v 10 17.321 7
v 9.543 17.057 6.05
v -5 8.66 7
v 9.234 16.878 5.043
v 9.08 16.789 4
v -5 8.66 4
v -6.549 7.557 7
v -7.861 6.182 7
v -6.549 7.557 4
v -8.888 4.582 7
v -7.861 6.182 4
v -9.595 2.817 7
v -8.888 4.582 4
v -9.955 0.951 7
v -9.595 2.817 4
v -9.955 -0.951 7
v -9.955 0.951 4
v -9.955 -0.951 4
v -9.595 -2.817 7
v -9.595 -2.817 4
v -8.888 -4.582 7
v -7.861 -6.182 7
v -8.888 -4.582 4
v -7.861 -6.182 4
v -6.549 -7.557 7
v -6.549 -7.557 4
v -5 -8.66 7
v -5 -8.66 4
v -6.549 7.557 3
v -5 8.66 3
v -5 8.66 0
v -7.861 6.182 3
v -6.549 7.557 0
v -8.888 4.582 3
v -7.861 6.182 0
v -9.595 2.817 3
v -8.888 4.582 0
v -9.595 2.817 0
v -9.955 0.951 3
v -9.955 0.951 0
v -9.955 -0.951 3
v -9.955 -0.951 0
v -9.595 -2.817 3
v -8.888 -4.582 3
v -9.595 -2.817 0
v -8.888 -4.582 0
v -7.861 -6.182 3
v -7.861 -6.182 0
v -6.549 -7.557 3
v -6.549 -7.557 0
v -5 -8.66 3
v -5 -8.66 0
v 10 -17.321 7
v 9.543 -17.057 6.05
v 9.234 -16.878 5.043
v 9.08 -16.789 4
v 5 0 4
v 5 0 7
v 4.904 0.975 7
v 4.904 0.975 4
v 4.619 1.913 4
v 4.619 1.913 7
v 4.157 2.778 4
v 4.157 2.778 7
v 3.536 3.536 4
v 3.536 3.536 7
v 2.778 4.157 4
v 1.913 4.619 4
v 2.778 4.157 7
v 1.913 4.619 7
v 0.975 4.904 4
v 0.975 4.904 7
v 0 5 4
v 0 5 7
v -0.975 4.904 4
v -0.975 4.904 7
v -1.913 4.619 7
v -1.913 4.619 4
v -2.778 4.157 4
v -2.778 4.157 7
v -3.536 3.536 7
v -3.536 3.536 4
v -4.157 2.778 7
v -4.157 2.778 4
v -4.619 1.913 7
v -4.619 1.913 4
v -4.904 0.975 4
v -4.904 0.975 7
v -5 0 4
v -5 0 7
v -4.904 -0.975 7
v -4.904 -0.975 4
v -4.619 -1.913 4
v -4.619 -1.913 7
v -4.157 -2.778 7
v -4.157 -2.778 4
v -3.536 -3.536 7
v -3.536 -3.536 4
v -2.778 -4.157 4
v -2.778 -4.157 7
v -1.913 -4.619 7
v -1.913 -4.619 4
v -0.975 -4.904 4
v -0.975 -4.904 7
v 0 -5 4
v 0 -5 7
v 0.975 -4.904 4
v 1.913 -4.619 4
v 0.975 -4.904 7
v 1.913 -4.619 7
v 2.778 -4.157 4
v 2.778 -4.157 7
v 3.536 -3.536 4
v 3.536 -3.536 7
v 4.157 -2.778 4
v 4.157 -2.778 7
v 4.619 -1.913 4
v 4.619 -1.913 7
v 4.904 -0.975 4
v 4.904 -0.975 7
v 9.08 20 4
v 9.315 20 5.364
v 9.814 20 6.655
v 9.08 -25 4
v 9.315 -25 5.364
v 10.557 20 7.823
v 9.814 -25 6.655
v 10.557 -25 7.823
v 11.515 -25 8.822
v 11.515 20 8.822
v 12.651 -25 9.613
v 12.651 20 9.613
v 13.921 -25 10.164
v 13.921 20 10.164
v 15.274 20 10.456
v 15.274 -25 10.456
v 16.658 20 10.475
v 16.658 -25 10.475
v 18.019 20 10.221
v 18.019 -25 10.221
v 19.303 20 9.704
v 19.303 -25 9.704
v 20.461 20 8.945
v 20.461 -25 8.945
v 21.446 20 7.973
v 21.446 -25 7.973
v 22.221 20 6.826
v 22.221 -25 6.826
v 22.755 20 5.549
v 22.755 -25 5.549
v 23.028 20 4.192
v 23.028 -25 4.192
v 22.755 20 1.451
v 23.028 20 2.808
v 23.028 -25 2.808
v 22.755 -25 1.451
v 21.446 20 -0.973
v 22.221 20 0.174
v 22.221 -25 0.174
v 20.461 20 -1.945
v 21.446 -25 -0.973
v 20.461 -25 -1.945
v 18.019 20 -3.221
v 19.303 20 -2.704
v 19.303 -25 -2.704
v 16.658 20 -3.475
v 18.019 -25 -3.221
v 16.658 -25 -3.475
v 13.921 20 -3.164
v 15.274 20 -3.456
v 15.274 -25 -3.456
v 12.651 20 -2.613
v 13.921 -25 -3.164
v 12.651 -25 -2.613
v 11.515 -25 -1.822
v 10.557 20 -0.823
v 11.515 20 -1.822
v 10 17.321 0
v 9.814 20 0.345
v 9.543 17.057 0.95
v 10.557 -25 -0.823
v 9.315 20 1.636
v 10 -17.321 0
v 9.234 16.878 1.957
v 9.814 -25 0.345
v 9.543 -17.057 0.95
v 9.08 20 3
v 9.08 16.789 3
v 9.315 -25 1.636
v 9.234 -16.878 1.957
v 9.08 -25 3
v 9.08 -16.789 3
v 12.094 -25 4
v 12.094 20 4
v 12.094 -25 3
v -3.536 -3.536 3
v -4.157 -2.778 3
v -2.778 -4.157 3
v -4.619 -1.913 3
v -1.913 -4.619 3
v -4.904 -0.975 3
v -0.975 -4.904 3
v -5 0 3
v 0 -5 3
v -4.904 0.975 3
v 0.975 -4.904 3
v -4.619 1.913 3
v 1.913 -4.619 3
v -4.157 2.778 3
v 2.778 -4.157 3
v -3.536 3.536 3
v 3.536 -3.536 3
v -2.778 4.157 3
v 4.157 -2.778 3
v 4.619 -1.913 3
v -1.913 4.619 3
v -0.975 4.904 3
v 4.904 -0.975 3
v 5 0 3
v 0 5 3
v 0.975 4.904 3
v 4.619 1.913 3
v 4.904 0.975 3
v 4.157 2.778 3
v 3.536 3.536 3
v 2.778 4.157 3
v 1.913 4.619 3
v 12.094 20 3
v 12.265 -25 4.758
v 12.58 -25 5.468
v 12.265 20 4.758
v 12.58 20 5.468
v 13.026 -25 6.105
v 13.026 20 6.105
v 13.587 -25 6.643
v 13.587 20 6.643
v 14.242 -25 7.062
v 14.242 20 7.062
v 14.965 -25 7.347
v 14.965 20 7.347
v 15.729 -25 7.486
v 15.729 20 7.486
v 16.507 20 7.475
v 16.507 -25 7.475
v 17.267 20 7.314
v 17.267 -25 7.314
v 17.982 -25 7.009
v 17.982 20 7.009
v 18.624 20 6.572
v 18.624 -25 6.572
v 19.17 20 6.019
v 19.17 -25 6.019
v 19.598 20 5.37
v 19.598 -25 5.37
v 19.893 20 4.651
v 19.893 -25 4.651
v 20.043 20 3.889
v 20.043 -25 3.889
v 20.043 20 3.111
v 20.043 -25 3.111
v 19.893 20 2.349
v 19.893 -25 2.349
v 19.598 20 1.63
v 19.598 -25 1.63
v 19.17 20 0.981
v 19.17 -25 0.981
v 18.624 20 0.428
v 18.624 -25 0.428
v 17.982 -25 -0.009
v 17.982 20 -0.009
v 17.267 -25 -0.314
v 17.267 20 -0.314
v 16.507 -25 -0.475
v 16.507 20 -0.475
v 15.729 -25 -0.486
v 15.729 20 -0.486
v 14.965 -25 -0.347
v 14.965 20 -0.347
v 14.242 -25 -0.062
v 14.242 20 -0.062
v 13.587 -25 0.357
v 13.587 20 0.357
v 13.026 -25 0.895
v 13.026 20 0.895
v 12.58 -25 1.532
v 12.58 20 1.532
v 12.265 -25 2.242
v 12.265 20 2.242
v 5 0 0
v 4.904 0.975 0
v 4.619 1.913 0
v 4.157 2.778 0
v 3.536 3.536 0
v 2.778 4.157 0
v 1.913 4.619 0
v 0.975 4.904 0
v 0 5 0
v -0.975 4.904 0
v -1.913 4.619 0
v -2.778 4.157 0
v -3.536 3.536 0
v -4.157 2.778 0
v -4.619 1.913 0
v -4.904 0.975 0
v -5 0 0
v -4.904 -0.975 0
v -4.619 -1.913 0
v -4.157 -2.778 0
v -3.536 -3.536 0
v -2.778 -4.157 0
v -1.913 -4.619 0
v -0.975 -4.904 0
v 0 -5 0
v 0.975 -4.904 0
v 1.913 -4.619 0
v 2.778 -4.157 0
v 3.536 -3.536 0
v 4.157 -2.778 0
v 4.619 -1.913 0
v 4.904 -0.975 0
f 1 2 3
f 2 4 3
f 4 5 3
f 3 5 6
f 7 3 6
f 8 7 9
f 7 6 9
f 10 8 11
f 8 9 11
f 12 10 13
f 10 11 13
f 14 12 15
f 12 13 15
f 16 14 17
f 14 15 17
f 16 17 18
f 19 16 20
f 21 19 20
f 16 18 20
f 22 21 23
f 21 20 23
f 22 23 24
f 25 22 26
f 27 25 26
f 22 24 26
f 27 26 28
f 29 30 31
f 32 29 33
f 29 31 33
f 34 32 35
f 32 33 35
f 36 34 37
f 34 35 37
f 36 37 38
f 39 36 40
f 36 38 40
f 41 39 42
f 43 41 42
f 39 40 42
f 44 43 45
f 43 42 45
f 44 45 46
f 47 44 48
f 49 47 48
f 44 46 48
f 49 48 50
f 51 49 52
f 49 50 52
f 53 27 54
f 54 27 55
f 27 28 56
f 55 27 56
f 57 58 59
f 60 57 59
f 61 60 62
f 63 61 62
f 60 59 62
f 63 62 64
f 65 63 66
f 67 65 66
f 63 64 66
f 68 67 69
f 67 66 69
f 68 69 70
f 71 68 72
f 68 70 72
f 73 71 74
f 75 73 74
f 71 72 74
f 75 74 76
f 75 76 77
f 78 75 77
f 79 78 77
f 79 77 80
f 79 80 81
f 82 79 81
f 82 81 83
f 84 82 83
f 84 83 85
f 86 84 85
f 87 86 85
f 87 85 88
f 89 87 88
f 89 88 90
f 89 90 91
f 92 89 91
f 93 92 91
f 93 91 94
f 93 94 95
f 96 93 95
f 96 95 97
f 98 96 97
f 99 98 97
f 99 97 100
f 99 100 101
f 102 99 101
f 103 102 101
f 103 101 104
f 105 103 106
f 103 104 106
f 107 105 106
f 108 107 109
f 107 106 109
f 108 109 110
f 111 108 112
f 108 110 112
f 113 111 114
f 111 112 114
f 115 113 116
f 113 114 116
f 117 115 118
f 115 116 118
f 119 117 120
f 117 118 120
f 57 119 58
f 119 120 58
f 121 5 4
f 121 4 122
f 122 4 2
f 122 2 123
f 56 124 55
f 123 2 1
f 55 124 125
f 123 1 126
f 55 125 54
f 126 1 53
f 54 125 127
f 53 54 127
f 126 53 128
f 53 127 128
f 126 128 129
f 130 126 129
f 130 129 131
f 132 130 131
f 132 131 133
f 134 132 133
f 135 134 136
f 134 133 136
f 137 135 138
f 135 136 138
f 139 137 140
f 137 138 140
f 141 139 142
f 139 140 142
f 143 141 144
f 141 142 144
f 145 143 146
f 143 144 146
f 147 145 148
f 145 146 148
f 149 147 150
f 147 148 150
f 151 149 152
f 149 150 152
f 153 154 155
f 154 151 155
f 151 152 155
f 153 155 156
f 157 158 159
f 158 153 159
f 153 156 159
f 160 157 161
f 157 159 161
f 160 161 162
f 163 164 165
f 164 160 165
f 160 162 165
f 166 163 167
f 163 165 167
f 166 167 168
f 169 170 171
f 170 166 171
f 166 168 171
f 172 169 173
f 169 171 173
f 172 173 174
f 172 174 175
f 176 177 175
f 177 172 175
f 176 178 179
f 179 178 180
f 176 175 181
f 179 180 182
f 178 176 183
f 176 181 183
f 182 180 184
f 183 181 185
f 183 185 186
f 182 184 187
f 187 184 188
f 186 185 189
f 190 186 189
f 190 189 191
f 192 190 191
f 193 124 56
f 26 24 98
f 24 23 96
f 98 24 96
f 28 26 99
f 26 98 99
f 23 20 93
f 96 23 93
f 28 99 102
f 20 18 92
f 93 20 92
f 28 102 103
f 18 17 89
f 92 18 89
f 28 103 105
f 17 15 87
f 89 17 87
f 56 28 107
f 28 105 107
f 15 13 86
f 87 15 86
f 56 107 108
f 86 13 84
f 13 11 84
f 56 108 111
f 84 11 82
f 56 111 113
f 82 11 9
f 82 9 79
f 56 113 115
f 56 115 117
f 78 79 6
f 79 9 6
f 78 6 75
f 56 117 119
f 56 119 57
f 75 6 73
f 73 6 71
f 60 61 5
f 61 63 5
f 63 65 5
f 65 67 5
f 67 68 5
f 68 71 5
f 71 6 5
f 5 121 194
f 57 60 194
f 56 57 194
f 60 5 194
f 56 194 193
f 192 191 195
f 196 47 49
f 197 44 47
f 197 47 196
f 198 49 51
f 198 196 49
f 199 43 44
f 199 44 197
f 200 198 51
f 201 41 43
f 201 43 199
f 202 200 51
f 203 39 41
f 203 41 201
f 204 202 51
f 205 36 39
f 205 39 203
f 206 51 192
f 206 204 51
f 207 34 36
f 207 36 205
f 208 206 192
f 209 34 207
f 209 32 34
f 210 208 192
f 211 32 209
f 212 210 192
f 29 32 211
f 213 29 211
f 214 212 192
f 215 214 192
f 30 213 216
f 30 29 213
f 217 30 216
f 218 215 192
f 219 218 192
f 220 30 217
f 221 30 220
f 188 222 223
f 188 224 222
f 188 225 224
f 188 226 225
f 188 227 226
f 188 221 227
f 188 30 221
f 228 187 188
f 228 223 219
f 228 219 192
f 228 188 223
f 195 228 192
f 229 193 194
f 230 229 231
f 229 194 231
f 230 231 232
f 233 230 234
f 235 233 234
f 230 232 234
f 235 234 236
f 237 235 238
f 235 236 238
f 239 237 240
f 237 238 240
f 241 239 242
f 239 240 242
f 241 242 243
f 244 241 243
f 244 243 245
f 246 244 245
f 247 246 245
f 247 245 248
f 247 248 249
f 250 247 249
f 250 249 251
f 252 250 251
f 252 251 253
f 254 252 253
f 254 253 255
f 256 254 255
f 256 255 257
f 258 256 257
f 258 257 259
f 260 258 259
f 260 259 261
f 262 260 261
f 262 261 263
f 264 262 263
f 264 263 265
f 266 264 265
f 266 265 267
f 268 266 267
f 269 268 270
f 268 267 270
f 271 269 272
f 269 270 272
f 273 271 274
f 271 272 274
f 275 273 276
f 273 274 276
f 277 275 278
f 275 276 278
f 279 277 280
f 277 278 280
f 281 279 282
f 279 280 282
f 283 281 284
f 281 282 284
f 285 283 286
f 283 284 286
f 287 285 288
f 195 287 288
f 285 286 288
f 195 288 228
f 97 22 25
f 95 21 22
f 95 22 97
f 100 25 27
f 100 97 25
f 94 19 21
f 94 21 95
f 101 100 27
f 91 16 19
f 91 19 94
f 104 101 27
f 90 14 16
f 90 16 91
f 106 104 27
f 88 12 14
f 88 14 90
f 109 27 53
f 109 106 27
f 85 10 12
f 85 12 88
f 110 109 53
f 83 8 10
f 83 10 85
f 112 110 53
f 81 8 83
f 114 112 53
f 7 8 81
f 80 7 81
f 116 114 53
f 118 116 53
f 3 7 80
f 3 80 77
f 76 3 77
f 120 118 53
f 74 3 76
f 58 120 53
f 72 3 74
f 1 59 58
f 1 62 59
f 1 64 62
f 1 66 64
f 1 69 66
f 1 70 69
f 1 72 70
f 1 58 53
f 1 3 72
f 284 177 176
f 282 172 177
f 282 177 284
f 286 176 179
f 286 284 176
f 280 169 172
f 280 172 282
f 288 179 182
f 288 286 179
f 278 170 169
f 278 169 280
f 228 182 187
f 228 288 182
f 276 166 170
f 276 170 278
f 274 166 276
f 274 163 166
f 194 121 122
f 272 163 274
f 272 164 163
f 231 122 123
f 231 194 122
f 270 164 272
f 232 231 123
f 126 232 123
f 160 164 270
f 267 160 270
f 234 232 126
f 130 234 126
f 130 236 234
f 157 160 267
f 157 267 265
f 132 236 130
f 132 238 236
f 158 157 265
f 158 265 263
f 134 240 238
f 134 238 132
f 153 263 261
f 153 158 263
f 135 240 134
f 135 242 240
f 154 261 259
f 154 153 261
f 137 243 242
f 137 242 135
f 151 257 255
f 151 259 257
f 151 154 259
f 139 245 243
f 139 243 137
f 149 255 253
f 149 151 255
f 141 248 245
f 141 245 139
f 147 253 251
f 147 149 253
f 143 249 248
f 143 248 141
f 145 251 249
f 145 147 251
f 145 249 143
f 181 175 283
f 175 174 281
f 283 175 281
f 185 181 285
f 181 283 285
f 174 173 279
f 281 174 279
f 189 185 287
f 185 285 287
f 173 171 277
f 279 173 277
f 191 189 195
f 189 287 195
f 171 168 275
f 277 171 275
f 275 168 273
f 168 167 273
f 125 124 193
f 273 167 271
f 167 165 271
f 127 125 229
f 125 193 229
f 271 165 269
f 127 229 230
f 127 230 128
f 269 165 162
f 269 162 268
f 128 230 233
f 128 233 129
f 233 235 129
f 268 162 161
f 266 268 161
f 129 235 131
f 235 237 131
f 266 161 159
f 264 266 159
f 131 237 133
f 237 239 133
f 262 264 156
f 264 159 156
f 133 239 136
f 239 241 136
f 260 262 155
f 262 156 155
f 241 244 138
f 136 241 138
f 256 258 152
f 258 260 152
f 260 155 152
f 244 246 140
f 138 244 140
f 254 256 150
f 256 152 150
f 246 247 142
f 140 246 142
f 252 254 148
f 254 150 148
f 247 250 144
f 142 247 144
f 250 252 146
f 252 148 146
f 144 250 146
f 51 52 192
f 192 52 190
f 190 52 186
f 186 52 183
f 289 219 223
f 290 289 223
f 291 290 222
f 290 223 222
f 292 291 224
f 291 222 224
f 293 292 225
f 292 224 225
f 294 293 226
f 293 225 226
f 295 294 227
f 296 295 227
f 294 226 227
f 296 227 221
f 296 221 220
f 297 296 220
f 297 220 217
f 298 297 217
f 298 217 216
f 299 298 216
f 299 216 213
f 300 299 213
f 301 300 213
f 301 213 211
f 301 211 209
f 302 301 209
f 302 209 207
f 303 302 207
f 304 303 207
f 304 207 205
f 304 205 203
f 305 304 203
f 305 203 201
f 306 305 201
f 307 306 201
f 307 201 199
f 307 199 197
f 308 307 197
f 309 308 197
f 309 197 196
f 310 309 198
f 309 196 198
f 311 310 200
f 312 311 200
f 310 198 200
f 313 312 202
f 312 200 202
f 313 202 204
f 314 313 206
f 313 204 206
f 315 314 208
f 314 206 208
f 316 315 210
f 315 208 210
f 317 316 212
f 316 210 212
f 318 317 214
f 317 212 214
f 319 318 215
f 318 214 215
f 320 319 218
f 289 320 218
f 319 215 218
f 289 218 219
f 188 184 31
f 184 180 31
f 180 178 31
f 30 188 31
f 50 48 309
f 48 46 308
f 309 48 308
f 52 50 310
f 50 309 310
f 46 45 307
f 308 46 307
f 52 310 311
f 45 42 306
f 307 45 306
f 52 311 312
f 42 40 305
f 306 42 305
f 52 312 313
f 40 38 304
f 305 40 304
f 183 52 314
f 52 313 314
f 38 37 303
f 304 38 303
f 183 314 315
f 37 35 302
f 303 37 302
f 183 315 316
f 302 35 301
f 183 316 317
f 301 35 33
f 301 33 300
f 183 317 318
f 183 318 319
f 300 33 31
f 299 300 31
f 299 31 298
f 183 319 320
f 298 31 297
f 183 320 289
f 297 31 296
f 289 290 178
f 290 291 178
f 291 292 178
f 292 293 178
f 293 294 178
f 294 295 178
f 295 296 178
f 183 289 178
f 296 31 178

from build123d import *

# Parameters (mm, degrees)
SKETCH_1_R           = 10
EXTRUDE_1_DEPTH      = 7
EXTRUDE_2_DEPTH      = 20
EXTRUDE_2_DEPTH_BACK = 25
SKETCH_2_R           = 7
SKETCH_3_R           = 4
SKETCH_3_W           = 26.062177826
SKETCH_3_H           = 1
CUT_EXTRUDE_1_DEPTH  = 55
SKETCH_4_R           = 5
CUT_EXTRUDE_2_DEPTH  = 55


with BuildPart() as part:
    # Эскиз1 → Бобышка-Вытянуть1 (new body)
    with BuildSketch(Plane.XY):
        Circle(SKETCH_1_R)
        with BuildLine():
            Line((10, -17.320508076), (10, 0))
            ThreePointArc((10, 0), (5, -8.660254038), (-5, -8.660254038))
            Line((-5, -8.660254038), (10, -17.320508076))
        make_face()
        with BuildLine():
            Line((10, 17.320508076), (-5, 8.660254038))
            ThreePointArc((-5, 8.660254038), (5, 8.660254038), (10, 0))
            Line((10, 0), (10, 17.320508076))
        make_face()
    extrude(amount=EXTRUDE_1_DEPTH)

    # Эскиз2 → Бобышка-Вытянуть2 (add, two sides: drawn at the far end of the back side and taken through both)
    with BuildSketch(Plane(origin=(0, 0, 0), x_dir=(1, 0, 0), z_dir=(0, 1, 0)).offset(-EXTRUDE_2_DEPTH_BACK)):
        with Locations(Location((16.062177826, -3.5, 0), (0, 0, 270))):
            Circle(SKETCH_2_R)
    extrude(amount=EXTRUDE_2_DEPTH + EXTRUDE_2_DEPTH_BACK)

    # Эскиз3 → Вырез-Вытянуть1 (cut)
    with BuildSketch(Plane(origin=(0, 20, 0), x_dir=(1, 0, 0), z_dir=(0, 1, 0))):
        with Locations((16.062177826, -3.5)):
            Circle(SKETCH_3_R)
        with Locations((3.031088913, -3.5)):
            Rectangle(SKETCH_3_W, SKETCH_3_H)
    extrude(amount=-CUT_EXTRUDE_1_DEPTH, mode=Mode.SUBTRACT)

    # Эскиз4 → Вырез-Вытянуть2 (cut)
    with BuildSketch(Plane.XY.offset(7)):
        Circle(SKETCH_4_R)
    extrude(amount=-CUT_EXTRUDE_2_DEPTH, mode=Mode.SUBTRACT)


solid = part.part
